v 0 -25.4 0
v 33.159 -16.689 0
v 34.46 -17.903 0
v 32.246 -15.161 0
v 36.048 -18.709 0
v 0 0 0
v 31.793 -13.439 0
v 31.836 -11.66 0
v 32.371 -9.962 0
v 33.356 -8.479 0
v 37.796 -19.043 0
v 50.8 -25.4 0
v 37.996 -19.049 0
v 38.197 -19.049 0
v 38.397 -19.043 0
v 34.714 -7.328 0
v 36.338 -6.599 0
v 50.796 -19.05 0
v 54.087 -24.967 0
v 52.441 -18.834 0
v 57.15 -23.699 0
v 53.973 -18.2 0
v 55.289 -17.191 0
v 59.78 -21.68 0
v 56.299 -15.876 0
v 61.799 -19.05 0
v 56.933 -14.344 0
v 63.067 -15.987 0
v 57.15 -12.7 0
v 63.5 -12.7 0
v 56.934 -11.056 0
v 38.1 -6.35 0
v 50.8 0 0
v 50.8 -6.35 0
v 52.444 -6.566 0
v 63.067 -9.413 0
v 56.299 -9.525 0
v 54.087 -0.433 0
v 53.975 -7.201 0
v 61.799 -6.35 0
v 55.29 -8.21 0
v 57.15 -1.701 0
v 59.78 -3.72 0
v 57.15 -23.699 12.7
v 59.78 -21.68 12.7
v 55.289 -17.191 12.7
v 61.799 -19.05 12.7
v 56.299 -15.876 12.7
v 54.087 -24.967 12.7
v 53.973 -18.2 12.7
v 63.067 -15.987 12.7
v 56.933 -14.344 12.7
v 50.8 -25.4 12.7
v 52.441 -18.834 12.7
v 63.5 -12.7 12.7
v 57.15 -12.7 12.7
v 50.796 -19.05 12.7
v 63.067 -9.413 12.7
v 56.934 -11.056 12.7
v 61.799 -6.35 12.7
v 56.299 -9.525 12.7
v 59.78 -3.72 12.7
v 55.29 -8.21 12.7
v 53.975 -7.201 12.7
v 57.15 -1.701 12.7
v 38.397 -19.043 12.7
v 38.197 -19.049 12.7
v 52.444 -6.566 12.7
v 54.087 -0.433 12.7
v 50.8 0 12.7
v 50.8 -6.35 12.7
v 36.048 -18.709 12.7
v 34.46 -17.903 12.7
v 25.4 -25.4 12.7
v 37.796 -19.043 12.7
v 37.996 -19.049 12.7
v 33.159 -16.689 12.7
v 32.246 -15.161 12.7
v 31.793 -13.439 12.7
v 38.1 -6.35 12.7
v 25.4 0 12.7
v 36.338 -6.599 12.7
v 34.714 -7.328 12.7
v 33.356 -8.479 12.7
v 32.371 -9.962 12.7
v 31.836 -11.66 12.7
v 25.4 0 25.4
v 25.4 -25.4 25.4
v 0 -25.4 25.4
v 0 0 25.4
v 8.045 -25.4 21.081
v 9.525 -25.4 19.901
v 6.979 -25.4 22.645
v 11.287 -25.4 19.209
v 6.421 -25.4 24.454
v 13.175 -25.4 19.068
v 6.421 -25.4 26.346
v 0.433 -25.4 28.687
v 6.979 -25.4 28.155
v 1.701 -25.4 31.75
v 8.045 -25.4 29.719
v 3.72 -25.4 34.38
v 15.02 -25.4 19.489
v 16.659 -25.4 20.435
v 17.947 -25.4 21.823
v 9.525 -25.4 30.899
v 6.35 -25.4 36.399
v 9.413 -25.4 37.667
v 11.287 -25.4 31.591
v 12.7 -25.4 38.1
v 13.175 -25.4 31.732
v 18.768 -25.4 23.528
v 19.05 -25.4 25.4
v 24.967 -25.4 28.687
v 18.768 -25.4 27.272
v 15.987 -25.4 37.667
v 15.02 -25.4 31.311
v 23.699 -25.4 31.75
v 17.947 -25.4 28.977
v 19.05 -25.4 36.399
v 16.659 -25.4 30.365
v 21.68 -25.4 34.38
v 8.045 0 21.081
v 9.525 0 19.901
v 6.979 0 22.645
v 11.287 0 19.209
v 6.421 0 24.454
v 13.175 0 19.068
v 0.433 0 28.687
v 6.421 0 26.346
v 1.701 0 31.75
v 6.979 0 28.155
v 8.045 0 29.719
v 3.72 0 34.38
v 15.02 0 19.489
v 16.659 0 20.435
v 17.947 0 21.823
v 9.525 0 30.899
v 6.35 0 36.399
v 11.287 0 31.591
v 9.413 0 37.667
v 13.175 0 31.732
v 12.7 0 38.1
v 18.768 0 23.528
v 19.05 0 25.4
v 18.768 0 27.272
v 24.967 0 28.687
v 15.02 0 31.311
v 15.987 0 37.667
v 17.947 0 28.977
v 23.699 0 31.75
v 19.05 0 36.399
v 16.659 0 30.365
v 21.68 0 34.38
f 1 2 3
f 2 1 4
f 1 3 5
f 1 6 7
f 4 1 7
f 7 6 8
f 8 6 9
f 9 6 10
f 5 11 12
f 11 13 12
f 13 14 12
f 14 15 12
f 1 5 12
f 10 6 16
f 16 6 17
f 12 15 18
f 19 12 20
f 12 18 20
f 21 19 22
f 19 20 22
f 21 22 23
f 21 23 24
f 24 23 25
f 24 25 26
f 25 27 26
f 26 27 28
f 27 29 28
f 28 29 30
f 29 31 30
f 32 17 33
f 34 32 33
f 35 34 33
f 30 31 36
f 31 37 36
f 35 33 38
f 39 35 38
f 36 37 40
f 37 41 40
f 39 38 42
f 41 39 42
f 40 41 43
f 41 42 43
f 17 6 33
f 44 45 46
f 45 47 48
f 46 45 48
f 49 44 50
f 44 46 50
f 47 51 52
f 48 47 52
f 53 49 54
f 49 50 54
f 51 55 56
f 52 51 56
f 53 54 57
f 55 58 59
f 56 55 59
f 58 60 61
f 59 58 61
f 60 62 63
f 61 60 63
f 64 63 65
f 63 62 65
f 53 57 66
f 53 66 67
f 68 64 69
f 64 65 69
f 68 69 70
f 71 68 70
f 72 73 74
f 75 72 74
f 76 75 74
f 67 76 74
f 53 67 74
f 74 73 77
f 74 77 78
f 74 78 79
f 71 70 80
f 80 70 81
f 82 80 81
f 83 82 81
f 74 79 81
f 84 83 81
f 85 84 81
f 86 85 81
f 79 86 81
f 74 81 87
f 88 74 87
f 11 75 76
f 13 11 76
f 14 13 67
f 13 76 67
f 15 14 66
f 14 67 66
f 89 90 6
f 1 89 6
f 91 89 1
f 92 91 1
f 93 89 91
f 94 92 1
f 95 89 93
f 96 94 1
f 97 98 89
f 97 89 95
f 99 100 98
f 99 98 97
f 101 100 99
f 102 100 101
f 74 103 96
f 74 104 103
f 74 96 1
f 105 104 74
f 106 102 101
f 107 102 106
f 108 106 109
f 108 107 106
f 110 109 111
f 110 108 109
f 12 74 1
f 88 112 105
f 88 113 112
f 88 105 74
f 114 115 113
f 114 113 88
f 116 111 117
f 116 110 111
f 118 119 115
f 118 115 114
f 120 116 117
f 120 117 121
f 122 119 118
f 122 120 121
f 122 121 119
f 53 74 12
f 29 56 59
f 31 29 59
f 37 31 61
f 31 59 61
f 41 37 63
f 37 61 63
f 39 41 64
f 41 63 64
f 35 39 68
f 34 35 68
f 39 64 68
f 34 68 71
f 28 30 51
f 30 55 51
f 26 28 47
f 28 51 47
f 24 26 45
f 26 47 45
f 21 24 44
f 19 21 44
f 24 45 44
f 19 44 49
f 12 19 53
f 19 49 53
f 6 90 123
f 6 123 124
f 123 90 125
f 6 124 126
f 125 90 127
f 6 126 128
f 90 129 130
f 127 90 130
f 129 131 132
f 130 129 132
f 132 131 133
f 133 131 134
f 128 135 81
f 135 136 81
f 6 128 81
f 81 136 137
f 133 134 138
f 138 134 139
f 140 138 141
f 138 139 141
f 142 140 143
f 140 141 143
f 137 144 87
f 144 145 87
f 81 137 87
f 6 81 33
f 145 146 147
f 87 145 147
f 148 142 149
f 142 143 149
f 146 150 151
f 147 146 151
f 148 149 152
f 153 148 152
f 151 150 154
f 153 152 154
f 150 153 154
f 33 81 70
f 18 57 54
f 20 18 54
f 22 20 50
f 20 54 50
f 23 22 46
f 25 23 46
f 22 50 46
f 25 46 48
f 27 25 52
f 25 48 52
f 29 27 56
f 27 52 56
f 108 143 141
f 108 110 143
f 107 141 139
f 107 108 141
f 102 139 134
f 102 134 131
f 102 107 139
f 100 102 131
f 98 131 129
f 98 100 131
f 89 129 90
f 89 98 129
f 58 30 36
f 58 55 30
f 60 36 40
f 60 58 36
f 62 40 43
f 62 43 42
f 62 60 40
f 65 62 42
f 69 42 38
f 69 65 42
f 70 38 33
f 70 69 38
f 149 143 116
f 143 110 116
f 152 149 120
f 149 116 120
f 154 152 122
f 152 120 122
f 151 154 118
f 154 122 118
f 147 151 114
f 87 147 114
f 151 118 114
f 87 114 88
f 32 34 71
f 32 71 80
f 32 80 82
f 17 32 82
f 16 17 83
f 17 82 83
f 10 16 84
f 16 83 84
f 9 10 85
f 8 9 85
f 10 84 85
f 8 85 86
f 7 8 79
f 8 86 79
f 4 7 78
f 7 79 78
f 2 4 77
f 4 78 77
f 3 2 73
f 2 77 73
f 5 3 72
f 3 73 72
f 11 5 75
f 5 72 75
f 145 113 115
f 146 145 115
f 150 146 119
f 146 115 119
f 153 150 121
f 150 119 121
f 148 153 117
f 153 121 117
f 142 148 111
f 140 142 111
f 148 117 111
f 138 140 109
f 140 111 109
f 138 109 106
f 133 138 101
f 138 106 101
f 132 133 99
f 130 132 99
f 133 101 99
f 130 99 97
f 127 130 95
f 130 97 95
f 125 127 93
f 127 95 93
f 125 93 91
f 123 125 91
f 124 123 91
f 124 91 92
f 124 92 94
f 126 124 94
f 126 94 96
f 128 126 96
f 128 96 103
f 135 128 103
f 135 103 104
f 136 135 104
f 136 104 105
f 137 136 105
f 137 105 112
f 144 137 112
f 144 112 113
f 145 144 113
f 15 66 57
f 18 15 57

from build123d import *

# Parameters (mm, degrees)
F1_DEPTH = 25.4
F2_R     = 12.7
F3_R     = 12.69999
F4_R     = 12.7
F5_R     = 12.69999
F7_DEPTH = 25.4
F8_R     = 6.35
F9_DEPTH = 31.75


# Not quite as in the source:
# - a fillet or chamfer is up to 0.001 mm smaller than in the source, because OpenCascade refuses the exact size


with BuildPart() as f1:
    # F0 (on Front) → F1 (new body)
    with BuildSketch(Plane.XZ):
        Polygon((0, 38.1), (0, 0), (63.5, 0), (63.5, 12.7), (25.4, 12.7), (25.4, 38.1), align=None)
    extrude(amount=F1_DEPTH)

    # F2
    f2_edges = [f1.edges().sort_by_distance(p)[0] for p in [
        (63.5, -25.4, 6.35),
    ]]
    fillet(f2_edges, radius=F2_R)

    # F3 (radius 12.7 in the source; OpenCascade refuses exactly that, so slightly less here)
    f3_edges = [f1.edges().sort_by_distance(p)[0] for p in [
        (63.5, 0, 6.35),
    ]]
    fillet(f3_edges, radius=F3_R)

    # F4
    f4_edges = [f1.edges().sort_by_distance(p)[0] for p in [
        (25.4, -12.7, 38.1),
    ]]
    fillet(f4_edges, radius=F4_R)

    # F5 (radius 12.7 in the source; OpenCascade refuses exactly that, so slightly less here)
    f5_edges = [f1.edges().sort_by_distance(p)[0] for p in [
        (0, -12.7, 38.1),
    ]]
    fillet(f5_edges, radius=F5_R)

    # F6 (on face) → F7 (cut)
    with BuildSketch(Plane.XY.offset(12.7)):
        with BuildLine():
            ThreePointArc((38.3966746256, -19.0430658334), (42.6938210606, -17.0839831277), (44.45, -12.7))
            ThreePointArc((44.45, -12.7), (42.5901280605, -8.2098719395), (38.1, -6.35))
            ThreePointArc((38.1, -6.35), (31.7518177342, -12.5480726474), (37.7962322754, -19.0427301038))
            Line((37.7962322754, -19.0427301038), (38.3966746256, -19.0430658334))
        make_face()
        with BuildLine():
            ThreePointArc((50.79644948, -19.0499990074), (46.3086168165, -17.1888725866), (44.45, -12.7))
            ThreePointArc((44.45, -12.7), (42.6938210606, -17.0839831277), (38.3966746256, -19.0430658334))
            Line((38.3966746256, -19.0430658334), (50.79644948, -19.0499990074))
        make_face()
        with BuildLine():
            ThreePointArc((38.1, -6.35), (42.5901280605, -8.2098719395), (44.45, -12.7))
            ThreePointArc((44.45, -12.7), (46.3098719395, -8.2098719395), (50.8, -6.35))
            Line((50.8, -6.35), (38.1, -6.35))
        make_face()
        with BuildLine():
            ThreePointArc((50.8, -6.35), (46.3098719395, -8.2098719395), (44.45, -12.7))
            ThreePointArc((44.45, -12.7), (46.3086168165, -17.1888725866), (50.79644948, -19.0499990074))
            ThreePointArc((50.79644948, -19.0499990074), (55.2888725866, -17.1913831835), (57.15, -12.7))
            ThreePointArc((57.15, -12.7), (55.2901280605, -8.2098719395), (50.8, -6.35))
        make_face()
        with BuildLine():
            ThreePointArc((37.7962322754, -19.0427301038), (38.09644948, -19.0499990074), (38.3966746256, -19.0430658334))
            Line((38.3966746256, -19.0430658334), (37.7962322754, -19.0427301038))
        make_face()
    extrude(amount=-F7_DEPTH, mode=Mode.SUBTRACT)

    # F8 (on face) → F9 (cut)
    with BuildSketch(Plane.XZ.offset(25.4)):
        with Locations((12.7, 25.4)):
            Circle(F8_R)
    extrude(amount=-F9_DEPTH, mode=Mode.SUBTRACT)


solid = f1.part
